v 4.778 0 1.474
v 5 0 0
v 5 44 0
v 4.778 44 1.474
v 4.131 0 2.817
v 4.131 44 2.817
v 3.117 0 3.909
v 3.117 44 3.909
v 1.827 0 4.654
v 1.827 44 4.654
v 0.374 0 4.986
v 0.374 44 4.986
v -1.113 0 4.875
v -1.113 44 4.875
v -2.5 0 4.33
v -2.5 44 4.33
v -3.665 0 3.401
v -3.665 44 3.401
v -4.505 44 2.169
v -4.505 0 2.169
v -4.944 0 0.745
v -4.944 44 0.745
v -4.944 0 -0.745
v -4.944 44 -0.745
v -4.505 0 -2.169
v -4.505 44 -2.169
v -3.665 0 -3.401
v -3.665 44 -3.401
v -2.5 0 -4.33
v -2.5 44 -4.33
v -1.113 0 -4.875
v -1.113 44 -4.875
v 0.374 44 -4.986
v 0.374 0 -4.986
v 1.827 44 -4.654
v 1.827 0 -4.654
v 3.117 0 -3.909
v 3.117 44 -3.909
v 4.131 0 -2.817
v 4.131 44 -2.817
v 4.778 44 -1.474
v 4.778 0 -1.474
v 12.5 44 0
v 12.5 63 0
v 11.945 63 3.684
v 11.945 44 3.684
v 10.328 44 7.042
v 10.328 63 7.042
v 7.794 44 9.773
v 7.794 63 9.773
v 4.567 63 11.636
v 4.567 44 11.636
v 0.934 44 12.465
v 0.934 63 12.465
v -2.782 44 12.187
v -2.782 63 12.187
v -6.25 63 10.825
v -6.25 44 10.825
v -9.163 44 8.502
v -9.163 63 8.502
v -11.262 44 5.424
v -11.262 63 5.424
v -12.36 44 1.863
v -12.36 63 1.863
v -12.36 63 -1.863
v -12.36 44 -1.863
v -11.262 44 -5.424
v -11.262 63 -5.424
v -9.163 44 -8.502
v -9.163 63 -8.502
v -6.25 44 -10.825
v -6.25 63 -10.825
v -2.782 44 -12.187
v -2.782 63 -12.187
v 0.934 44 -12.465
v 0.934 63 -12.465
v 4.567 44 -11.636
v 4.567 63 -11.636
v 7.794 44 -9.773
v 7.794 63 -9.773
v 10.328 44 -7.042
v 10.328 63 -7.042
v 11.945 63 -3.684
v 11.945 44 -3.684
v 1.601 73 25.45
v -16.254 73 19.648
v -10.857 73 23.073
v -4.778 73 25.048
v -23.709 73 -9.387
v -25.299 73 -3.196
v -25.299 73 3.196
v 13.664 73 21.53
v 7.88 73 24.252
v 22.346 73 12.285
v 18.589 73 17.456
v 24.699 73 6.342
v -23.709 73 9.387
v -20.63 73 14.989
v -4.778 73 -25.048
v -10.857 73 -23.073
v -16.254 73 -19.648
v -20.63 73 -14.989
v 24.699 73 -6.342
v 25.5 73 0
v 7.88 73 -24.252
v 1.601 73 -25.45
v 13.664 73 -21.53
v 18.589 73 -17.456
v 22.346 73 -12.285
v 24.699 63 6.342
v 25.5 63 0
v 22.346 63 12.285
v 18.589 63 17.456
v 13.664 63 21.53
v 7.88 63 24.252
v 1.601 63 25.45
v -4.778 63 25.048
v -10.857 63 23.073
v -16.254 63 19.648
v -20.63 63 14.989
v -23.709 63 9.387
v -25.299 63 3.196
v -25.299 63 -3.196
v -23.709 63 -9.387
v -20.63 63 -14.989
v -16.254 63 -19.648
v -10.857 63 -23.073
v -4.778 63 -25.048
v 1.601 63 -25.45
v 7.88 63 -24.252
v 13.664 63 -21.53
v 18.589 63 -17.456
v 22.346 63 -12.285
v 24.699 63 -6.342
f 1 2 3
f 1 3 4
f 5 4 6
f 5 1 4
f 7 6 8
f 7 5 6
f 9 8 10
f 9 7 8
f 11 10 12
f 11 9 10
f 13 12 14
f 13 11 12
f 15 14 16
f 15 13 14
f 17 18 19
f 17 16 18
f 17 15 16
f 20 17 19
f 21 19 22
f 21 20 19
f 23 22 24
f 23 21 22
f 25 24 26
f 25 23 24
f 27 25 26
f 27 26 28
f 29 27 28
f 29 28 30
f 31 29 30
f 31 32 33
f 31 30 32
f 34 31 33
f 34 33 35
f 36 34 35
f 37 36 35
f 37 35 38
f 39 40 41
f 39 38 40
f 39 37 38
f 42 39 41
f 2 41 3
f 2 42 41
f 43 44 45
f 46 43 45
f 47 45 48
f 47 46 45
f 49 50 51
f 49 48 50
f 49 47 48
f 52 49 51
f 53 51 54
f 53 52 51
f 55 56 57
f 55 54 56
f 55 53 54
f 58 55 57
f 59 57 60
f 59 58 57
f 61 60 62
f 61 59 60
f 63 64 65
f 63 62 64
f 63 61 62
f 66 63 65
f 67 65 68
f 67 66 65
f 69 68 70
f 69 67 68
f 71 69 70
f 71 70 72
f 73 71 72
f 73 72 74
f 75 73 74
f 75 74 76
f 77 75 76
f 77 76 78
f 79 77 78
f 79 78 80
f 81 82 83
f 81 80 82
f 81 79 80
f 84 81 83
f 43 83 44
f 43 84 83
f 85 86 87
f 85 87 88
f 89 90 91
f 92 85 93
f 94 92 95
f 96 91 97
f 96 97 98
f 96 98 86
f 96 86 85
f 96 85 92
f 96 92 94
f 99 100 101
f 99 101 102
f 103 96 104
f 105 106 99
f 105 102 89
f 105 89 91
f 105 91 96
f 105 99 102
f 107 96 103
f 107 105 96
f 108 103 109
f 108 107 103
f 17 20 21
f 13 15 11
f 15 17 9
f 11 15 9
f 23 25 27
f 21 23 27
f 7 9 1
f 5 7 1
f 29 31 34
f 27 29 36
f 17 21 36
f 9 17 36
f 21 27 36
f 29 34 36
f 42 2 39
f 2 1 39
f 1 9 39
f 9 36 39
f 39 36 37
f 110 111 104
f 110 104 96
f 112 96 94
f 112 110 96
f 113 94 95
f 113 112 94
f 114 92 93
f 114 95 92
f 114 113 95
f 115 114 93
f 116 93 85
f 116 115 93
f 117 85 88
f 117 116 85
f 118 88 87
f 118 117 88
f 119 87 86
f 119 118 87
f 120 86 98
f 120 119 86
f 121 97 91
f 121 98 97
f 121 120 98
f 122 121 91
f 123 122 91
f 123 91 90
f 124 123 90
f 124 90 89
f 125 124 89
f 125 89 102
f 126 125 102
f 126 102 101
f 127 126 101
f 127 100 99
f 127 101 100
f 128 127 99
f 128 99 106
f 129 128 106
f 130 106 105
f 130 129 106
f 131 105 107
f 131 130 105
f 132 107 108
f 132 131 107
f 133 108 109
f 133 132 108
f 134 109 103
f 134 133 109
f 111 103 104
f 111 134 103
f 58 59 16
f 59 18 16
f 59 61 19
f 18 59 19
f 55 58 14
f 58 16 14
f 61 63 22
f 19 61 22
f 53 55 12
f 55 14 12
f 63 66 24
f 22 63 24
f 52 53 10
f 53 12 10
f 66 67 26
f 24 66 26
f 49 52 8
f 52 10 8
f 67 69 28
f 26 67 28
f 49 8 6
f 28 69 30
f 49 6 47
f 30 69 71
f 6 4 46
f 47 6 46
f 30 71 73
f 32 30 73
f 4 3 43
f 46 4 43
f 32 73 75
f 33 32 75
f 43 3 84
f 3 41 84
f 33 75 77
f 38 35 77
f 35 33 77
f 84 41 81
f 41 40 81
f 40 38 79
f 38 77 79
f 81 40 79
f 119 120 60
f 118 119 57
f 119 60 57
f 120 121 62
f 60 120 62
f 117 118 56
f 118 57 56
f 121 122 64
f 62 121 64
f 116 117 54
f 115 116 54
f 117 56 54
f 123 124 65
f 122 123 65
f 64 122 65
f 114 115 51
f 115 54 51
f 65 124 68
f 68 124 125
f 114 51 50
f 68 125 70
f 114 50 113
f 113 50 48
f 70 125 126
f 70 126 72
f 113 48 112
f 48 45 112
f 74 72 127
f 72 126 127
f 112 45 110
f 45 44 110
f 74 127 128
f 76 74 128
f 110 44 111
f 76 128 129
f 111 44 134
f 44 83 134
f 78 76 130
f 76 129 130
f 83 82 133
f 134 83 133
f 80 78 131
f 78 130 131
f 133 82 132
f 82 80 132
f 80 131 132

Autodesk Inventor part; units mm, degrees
ref_plane "YZ Plane" through (0, 0, 0) normal (1, 0, 0) x (0, 1, 0)
ref_plane "XZ Plane" through (0, 0, 0) normal (0, 1, 0) x (-1, 0, 0)
ref_plane "XY Plane" through (0, 0, 0) normal (0, 0, 1) x (1, 0, 0)
sketch "Sketch1" plane through (0, 0, 0) normal (0, 0, 1) x (1, 0, 0)
  line L0 (0, 0) -> (0, 73)
  line L1 (0, 73) -> (25.5, 73)
  line L2 (25.5, 73) -> (25.5, 63)
  line L3 (25.5, 63) -> (12.5, 63)
  line L4 (12.5, 63) -> (12.5, 44)
  line L5 (12.5, 44) -> (5, 44)
  line L6 (5, 44) -> (5, 0)
  line L7 (5, 0) -> (0, 0)
  dimension "d0" = 25.5
  dimension "d1" = 10
  dimension "d2" = 19
  dimension "d3" = 12.5
  dimension "d4" = 44
  dimension "d5" = 5
revolve "Revolution1" add sketch "Sketch1" angle 360 about axis through (0, 0, 0) along (0, 1, 0)
properties part number "Knob"
